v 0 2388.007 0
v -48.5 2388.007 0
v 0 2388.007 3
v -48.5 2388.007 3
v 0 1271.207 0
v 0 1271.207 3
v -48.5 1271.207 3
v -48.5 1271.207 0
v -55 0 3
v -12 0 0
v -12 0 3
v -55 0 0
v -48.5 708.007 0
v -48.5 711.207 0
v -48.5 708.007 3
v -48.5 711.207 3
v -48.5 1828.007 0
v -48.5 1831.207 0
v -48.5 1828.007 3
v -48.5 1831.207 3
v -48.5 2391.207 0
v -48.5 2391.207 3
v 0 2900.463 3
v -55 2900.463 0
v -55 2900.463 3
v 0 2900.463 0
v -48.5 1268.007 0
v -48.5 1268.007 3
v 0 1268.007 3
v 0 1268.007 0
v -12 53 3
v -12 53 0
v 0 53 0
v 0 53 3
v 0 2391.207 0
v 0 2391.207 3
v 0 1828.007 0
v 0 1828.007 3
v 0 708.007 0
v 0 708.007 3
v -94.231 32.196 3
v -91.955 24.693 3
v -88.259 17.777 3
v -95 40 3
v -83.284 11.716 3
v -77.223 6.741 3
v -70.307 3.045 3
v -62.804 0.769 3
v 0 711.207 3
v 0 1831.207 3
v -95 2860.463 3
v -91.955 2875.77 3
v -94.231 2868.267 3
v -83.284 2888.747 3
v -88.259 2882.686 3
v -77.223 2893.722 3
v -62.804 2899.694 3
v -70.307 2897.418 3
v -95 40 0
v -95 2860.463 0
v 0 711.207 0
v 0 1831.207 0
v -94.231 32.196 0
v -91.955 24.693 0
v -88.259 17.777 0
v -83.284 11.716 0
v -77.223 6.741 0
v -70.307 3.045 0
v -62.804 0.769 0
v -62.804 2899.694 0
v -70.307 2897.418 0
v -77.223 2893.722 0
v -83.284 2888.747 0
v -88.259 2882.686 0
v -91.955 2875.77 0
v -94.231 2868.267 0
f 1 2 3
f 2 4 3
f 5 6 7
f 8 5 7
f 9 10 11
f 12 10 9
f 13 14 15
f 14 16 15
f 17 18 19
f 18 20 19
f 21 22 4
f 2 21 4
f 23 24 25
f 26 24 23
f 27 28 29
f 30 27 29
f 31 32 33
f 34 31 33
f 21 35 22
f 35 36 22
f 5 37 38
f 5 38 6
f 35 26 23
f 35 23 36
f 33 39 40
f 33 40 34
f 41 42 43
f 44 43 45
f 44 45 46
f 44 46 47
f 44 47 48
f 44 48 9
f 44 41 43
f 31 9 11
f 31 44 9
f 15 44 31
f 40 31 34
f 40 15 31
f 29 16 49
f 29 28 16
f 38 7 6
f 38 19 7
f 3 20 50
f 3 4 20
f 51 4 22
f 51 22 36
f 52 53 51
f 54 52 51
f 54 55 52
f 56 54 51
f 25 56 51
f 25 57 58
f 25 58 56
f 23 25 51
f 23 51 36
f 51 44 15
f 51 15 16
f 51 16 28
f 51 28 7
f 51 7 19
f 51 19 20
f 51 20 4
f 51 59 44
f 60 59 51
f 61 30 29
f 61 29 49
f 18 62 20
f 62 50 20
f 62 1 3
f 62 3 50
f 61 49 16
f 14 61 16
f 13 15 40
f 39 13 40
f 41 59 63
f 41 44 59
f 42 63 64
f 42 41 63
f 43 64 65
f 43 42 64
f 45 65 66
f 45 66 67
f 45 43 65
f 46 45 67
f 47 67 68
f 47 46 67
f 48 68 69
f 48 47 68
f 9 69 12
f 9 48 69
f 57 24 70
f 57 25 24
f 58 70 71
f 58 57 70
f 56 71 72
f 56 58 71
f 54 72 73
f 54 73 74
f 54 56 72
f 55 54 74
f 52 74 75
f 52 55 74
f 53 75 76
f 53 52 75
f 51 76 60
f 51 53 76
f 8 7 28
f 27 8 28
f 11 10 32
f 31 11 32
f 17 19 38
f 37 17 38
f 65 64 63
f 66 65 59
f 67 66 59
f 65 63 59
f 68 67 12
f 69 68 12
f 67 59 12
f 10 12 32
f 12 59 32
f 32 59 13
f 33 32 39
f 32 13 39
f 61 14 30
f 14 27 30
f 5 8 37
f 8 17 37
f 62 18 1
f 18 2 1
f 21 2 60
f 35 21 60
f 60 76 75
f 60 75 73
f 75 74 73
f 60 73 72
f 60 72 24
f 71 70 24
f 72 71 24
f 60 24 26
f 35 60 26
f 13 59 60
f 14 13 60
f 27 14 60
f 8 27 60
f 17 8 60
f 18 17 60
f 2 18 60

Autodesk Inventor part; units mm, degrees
ref_plane "YZ Plane" through (0, 0, 0) normal (1, 0, 0) x (0, 1, 0)
ref_plane "XZ Plane" through (0, 0, 0) normal (0, 1, 0) x (-1, 0, 0)
ref_plane "XY Plane" through (0, 0, 0) normal (0, 0, 1) x (1, 0, 0)
sketch "Sketch1" plane through (0, 0, 0) normal (0, 0, 1) x (1, 0, 0)
  line L0 (-95, 2900.463) -> (0, 2900.463)
  line L1 (0, 2900.463) -> (0, 0)
  line L2 (0, 0) -> (-95, 0)
  line L3 (-95, 0) -> (-95, 2900.463)
  line L4 (-12, 53) -> (0, 53)
  line L5 (0, 53) -> (0, 0)
  line L6 (0, 0) -> (-12, 0)
  line L7 (-12, 0) -> (-12, 53)
  point P0 (-12, 0)
  dimension "d0" = 95
  dimension "d1" = 2900.463
  dimension "d10" = 12
  dimension "d11" = 53
extrude "Plate1" add sketch "Sketch1" along normal blind 3 contours L0 L1 L4 L7 L2 L3
sketch "Sketch2" plane through (0, 0, 3) normal (0, 0, 1) x (1, 0, 0)
  line L0 (0, 0) -> (0, 2900.463) projected
  line L1 (0, 2391.207) -> (-48.5, 2391.207)
  line L2 (-48.5, 2391.207) -> (-48.5, 2388.007)
  line L3 (-48.5, 2388.007) -> (0, 2388.007)
  line L4 (0, 2388.007) -> (0, 2391.207)
  point P0 (0, 2388.007)
  dimension "d3" = 509.256
  dimension "d4" = 3.2
  dimension "d5" = 48.5
extrude "Extrusion1" cut sketch "Sketch2" against normal through all
pattern_linear "Rectangular Pattern1" count 4 spacing 560 along (0, -1, 0) of "Extrusion1"
fillet "Corner Round1" radius 40 2 edges at (-95, 2900.463, 1.5) (-95, 0, 1.5)
equation "\"d2\" = Thickness"
equation "\"BendReliefWidth\" = Thickness"
equation "\"BendReliefDepth\" = 0.5 * Thickness"
equation "\"CornerReliefSize\" = 4 * Thickness"
equation "\"MinimumRemnant\" = 2 * Thickness"
equation "\"TransitionRadius\" = BendRadius"
equation "\"JacobiRadiusSize\" = BendRadius"
equation "\"GapSize\" = Thickness"
equation "\"Thickness\" = 3"
equation "\"BendRadius\" = 5"
properties part number "BSH 023 rib butt end" material "Steel"
